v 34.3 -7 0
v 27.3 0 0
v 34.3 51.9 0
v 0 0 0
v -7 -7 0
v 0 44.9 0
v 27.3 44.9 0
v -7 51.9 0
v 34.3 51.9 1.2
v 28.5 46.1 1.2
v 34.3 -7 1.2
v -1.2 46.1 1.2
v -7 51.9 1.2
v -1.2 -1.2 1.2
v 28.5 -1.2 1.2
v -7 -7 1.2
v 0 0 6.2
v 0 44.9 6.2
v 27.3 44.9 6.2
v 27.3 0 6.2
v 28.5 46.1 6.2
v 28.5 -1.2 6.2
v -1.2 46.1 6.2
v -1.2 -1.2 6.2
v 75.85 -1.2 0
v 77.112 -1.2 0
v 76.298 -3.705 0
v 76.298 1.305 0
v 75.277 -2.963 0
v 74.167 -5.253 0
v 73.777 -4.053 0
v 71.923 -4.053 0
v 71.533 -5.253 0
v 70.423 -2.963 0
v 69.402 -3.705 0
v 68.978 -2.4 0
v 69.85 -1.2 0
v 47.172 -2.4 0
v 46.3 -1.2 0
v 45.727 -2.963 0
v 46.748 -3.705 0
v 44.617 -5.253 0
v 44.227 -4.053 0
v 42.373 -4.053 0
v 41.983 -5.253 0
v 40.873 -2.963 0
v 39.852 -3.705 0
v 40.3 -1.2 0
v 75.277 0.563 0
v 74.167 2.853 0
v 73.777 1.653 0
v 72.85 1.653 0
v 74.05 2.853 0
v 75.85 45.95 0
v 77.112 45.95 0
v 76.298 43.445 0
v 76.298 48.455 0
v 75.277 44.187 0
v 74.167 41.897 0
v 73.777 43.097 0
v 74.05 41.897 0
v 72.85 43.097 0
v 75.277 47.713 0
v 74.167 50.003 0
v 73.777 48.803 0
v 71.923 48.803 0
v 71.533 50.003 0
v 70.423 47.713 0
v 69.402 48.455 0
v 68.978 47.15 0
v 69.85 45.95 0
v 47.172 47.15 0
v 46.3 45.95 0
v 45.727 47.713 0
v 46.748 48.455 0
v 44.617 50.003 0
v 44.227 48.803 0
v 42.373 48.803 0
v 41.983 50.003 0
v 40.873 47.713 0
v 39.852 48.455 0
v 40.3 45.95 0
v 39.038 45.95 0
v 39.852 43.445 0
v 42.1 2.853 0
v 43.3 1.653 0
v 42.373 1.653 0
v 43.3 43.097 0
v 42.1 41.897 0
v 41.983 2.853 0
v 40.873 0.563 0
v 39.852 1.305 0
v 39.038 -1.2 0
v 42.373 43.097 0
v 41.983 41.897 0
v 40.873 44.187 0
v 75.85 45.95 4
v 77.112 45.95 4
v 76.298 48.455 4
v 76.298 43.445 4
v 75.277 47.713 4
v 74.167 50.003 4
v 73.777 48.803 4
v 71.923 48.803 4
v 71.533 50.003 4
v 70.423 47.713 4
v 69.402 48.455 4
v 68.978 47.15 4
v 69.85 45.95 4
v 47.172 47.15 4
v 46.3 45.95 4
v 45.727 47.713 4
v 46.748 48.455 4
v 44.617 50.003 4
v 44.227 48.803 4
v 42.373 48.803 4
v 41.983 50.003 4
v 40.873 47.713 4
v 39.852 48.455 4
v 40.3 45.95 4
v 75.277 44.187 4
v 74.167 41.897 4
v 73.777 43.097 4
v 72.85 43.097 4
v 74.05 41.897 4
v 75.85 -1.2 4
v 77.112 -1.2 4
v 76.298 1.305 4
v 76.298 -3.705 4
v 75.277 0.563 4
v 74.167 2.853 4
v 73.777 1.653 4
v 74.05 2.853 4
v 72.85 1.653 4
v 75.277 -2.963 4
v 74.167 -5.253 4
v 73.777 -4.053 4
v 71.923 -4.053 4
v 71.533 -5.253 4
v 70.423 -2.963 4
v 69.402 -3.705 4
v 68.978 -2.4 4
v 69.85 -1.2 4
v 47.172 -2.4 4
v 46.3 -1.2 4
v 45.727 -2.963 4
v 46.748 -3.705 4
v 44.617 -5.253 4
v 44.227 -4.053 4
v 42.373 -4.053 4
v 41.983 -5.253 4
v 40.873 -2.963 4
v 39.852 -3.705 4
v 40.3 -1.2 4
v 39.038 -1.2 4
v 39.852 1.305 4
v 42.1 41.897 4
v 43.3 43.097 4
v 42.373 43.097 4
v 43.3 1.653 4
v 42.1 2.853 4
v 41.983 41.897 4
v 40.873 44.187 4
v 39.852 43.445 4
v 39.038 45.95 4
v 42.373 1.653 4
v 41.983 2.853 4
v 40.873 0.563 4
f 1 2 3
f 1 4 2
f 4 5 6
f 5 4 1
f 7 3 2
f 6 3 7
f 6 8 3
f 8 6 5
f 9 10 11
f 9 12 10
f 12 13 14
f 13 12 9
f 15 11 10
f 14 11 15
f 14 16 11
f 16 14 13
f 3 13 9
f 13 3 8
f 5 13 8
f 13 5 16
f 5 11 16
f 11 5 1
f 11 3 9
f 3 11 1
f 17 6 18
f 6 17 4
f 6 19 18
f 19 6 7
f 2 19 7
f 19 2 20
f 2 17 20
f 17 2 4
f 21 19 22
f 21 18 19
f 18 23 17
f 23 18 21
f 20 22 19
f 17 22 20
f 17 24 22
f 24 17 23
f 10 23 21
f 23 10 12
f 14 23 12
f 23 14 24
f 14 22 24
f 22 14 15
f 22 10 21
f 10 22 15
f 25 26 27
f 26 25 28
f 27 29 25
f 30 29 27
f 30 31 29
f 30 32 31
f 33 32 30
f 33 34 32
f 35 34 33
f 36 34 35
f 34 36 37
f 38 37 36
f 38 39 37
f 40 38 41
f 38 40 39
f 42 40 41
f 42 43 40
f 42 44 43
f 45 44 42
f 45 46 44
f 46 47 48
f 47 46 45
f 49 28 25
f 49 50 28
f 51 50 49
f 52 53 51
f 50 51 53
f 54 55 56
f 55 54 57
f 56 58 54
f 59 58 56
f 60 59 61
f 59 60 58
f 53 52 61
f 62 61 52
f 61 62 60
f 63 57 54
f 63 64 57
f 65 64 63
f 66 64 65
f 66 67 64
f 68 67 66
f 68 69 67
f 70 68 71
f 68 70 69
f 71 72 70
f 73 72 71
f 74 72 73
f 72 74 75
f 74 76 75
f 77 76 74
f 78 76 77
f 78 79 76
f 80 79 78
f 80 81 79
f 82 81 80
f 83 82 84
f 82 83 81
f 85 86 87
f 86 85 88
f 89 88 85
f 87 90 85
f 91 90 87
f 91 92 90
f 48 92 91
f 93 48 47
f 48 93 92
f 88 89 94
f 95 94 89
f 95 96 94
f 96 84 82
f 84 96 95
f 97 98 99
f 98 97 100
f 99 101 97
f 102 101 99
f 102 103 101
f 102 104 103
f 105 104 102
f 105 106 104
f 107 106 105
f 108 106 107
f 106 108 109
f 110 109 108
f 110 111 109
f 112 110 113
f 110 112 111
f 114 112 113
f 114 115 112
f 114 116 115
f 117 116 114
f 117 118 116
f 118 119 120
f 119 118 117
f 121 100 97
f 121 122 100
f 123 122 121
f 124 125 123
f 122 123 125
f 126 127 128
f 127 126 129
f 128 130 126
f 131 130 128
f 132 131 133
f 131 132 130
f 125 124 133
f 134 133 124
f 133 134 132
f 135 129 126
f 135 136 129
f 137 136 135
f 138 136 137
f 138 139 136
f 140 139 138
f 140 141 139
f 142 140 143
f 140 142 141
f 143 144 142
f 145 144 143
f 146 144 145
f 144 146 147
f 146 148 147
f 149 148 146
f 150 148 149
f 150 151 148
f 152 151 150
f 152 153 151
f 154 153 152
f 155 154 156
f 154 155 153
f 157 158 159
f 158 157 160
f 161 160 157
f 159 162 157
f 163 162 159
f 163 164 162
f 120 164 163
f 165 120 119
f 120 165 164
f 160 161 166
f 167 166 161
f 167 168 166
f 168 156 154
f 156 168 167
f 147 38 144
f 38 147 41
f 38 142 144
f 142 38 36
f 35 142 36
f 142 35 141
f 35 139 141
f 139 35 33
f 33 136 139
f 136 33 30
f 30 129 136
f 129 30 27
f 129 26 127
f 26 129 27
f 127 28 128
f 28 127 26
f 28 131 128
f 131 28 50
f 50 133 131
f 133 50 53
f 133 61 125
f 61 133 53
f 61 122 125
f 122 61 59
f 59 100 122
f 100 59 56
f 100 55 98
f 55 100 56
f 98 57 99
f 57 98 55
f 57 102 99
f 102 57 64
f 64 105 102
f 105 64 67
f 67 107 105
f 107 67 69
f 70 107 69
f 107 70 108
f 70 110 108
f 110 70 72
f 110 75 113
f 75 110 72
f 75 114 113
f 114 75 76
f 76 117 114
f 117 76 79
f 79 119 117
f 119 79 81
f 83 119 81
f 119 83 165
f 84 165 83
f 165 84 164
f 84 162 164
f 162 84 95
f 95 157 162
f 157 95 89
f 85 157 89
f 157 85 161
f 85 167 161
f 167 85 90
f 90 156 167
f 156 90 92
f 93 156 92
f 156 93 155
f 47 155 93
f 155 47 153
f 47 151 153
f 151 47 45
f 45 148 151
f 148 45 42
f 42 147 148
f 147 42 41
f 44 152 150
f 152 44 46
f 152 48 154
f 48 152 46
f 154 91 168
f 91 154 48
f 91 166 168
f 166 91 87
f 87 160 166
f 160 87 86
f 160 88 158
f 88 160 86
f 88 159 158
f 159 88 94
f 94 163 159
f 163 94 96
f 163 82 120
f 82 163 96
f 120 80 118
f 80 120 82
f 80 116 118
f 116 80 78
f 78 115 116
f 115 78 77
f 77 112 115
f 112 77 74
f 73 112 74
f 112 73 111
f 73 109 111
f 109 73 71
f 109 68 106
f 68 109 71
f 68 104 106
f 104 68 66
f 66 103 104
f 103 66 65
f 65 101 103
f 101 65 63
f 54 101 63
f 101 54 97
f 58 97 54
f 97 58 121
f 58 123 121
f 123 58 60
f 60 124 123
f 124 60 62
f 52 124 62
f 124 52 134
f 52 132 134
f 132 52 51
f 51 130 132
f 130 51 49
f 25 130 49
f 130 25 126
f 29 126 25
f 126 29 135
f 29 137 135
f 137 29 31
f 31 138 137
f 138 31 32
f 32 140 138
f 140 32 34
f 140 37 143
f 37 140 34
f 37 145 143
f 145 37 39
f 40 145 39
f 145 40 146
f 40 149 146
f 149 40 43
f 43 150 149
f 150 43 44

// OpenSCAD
// Parametric bezel
// by Andy Gock

// actual panel cutout is minumum: width + 2 * (clearance + bezel_thickness)

// width of device (not including clearance)
width = 27.1;

// height of device (not including clearance)
height = 44.7;

// clearance for the opening per each edge
clearance = 0.1;

// wall thickness, both vertical and horizontal
bezel_thickness = 1.2;

// width of bezel as viewed from outside
bezel_width = 7.0;

// depth of opening
depth = 5.0;

// the retainer fits on the inside of the panel

// increase = less spring tension, more strength
retainer_thickness = 1.2;

// increase = less spring tension
retainer_radius = 3.0;

retainer_height = 4.0;

// set inside of retainer a little smaller than outside of bezel inner wall

// set >= 0, increase for tighter fit
retainer_negative_clearance =0.15;

// round the corners of bezel, set to true or false
round_corners = false; // [true:use round bezel corners,false:use square bezel corners]

// 0 = create both bezel and retainer
// 1 = create bezel only
// 2 = create retainer only
action = 0; // [0:create both bezel and retainer,1:create bezel only,2:create retainer only]

// calculated vars

module _bezel_opening() {
	square([width + 2 * clearance, height + 2 * clearance]);
}

module bezel() {

	// outer section of bezel
	linear_extrude(height = bezel_thickness) {
		difference() {
			if (round_corners)
				offset(r = bezel_width, chamfer=false)
					_bezel_opening();
			else
				offset(delta = bezel_width, chamfer=false)
					_bezel_opening();
			_bezel_opening();
		}
	}

	// inner wall section of bezel
	linear_extrude(height = depth + bezel_thickness) {
		difference() {
			offset(delta = bezel_thickness, chamfer=false)
				_bezel_opening();
			_bezel_opening();
		}
	}

}

module bezel_retainer_shape() {
	// size of inside opening of the retainer
	_x = width + 2 * (clearance + bezel_thickness) - retainer_negative_clearance;
	_y = height + 2 * (clearance + bezel_thickness)- retainer_negative_clearance;

	translate([-bezel_thickness, -bezel_thickness, 0]) {
		translate([0,0,0]) circle(retainer_radius);
		translate([_x,0,0]) circle(retainer_radius);
		translate([0,_y,0]) circle(retainer_radius);
		translate([_x,_y,0]) circle(retainer_radius);
		square([_x, _y]);
	}
}

module bezel_retainer() {

	linear_extrude(height = retainer_height) {
		difference() {
			offset(delta = retainer_thickness, chamfer = false)
				bezel_retainer_shape();
			bezel_retainer_shape();
		}
	}
}

if (action == 0 || action == 1) {
	bezel();
}

if (action == 0) {
	// put retainer next to bezel()
	translate([5 + width + bezel_thickness + bezel_width + retainer_radius + retainer_thickness, 0, 0]) {
		bezel_retainer();
	}
}

// don't translate if creating retainer only
if (action == 2) {
	bezel_retainer();
}
